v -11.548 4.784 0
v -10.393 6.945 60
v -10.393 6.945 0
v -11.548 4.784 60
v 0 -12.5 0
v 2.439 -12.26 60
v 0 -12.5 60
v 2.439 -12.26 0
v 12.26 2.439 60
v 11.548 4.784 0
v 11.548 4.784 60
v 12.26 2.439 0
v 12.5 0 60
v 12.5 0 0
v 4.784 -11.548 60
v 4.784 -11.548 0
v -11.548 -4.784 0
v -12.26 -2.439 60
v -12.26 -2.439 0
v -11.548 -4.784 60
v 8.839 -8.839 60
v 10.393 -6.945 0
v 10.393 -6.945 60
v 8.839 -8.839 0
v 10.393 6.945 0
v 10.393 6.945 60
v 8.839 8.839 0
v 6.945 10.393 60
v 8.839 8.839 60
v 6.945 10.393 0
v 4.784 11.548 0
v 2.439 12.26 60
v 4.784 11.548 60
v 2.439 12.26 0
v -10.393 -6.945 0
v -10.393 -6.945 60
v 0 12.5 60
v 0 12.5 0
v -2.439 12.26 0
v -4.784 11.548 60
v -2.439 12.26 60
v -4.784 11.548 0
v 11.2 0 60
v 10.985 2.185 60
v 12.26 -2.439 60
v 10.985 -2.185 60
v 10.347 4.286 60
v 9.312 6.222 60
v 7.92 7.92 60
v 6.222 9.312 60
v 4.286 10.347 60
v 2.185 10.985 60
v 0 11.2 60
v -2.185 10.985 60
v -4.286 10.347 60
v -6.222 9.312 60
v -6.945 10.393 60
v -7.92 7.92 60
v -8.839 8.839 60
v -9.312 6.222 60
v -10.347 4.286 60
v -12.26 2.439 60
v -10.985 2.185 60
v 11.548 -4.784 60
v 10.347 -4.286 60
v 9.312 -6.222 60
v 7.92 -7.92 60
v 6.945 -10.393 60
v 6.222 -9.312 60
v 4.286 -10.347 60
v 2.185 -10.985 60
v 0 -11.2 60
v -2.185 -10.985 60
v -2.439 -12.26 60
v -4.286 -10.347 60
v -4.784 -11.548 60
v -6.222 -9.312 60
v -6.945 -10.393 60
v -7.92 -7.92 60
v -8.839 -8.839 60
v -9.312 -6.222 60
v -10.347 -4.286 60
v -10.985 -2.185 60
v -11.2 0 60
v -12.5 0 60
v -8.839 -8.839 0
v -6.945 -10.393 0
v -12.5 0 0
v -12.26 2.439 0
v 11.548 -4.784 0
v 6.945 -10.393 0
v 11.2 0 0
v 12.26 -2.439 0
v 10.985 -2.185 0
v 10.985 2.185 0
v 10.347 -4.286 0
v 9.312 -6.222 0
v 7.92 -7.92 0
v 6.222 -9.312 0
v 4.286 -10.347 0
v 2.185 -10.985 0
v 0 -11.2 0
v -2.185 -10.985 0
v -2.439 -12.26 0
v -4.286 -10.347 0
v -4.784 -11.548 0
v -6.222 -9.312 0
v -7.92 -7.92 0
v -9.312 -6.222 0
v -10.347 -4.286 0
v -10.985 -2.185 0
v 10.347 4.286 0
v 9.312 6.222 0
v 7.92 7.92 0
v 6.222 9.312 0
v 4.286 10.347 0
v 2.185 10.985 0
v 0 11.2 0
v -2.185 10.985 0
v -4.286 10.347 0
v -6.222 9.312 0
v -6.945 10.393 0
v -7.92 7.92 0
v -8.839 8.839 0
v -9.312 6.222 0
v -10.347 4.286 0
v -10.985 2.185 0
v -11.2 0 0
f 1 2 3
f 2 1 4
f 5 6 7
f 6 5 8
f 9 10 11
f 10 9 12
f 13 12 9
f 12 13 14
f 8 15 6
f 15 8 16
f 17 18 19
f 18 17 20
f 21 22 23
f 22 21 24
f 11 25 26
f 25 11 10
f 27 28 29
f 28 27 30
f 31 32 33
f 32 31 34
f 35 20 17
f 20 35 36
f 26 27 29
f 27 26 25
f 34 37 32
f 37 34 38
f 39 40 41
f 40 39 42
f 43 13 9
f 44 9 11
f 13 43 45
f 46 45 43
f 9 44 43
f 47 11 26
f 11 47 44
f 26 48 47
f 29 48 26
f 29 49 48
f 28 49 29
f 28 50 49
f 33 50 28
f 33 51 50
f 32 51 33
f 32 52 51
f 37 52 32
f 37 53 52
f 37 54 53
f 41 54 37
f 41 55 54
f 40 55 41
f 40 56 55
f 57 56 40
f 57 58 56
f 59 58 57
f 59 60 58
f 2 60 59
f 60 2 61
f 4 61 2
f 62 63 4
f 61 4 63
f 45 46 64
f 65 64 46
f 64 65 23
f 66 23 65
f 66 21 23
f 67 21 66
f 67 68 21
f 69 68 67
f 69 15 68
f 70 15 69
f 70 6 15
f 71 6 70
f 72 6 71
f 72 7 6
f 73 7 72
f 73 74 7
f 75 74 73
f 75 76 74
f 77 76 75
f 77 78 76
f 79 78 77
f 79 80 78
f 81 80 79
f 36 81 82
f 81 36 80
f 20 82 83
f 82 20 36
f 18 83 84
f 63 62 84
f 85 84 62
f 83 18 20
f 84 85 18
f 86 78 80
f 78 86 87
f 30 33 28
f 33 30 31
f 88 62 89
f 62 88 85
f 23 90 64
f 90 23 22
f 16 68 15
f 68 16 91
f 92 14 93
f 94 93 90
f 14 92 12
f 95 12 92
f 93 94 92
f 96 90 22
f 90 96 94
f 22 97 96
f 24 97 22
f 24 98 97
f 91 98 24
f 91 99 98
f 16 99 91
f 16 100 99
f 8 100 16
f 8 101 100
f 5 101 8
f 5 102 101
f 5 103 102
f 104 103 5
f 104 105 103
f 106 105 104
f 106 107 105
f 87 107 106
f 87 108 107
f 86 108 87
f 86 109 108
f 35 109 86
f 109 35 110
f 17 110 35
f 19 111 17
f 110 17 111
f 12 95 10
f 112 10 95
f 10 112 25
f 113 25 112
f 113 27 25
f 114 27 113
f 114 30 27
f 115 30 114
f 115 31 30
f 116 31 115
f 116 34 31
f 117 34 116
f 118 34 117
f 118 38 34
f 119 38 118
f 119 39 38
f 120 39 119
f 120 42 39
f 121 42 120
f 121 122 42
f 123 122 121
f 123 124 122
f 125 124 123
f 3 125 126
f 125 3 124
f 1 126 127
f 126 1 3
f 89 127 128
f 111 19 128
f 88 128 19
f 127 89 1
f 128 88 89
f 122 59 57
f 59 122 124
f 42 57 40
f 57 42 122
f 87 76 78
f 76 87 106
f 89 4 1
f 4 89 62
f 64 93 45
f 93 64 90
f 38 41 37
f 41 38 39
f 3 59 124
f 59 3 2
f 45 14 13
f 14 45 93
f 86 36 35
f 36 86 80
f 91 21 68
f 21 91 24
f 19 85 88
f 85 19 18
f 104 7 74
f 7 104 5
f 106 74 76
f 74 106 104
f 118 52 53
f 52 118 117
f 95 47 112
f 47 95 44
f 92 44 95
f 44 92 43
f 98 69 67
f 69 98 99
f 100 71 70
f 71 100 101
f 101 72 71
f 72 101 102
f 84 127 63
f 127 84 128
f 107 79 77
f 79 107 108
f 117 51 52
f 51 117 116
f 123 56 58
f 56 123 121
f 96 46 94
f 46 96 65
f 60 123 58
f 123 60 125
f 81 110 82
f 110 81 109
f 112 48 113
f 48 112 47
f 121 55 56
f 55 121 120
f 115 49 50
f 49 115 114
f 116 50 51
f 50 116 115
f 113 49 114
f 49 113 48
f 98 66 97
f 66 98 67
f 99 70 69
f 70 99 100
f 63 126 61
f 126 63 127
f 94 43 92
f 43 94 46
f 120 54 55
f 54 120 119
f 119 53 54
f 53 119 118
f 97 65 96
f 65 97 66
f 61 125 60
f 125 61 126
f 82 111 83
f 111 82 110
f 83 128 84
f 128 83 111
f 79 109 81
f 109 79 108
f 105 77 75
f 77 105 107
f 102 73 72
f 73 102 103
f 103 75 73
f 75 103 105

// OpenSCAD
$fn = 32;

// ----------------------------------------------------------------------
// Thin tube: 1.3 mm wall
// ----------------------------------------------------------------------

// --- parameters (mm) ---
tube_od = 25;             // outer diameter
tube_h = 60;              // height, Z
wall = 1.3;               // wall thickness
fit_tol = 0.02;           // tolerance for press fits, mm
free_tol = 0.2;           // tolerance for clearance fits, mm

difference() {
  cylinder(h = tube_h, d = tube_od);
  translate([0, 0, -1]) cylinder(h = tube_h + 2, d = tube_od - 2 * wall);
}
